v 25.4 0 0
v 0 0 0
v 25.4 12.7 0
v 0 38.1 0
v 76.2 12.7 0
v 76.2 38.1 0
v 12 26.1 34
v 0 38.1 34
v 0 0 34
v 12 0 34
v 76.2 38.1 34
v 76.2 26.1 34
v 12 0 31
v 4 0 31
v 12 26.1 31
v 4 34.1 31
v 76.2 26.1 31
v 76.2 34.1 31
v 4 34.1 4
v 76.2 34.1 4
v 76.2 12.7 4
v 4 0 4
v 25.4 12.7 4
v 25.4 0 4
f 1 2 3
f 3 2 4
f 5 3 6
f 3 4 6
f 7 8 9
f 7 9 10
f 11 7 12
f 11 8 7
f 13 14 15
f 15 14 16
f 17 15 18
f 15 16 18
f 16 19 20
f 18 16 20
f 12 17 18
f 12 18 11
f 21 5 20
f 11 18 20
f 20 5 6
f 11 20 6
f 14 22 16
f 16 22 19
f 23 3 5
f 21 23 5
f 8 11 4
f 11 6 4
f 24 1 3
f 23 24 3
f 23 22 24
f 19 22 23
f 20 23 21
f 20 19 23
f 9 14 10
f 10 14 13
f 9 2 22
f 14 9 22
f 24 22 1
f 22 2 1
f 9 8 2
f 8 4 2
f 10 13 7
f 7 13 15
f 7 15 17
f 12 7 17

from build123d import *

# Parameters (mm, degrees)
F1_DEPTH = 4
F3_DEPTH = 27
F5_DEPTH = 3


with BuildPart() as f1:
    # F0 (on Top) → F1 (new body)
    with BuildSketch(Plane.XY):
        Polygon((0, 38.1), (0, 0), (25.4, 0), (25.4, 12.7), (76.2, 12.7), (76.2, 38.1), align=None)
    extrude(amount=F1_DEPTH)

    # F2 (on face) → F3 (join)
    with BuildSketch(Plane.XY.offset(4)):
        Polygon((76.2, 34.1), (76.2, 38.1), (0, 38.1), (0, 0), (4, 0), (4, 34.1), align=None)
    extrude(amount=F3_DEPTH)

    # F4 (on face) → F5 (join)
    with BuildSketch(Plane.XY.offset(31)):
        Polygon((76.2, 26.1), (76.2, 34.1), (4, 34.1), (4, 0), (12, 0), (12, 26.1), align=None)
        Polygon((76.2, 34.1), (76.2, 38.1), (0, 38.1), (0, 0), (4, 0), (4, 34.1), align=None)
    extrude(amount=F5_DEPTH)


solid = f1.part
